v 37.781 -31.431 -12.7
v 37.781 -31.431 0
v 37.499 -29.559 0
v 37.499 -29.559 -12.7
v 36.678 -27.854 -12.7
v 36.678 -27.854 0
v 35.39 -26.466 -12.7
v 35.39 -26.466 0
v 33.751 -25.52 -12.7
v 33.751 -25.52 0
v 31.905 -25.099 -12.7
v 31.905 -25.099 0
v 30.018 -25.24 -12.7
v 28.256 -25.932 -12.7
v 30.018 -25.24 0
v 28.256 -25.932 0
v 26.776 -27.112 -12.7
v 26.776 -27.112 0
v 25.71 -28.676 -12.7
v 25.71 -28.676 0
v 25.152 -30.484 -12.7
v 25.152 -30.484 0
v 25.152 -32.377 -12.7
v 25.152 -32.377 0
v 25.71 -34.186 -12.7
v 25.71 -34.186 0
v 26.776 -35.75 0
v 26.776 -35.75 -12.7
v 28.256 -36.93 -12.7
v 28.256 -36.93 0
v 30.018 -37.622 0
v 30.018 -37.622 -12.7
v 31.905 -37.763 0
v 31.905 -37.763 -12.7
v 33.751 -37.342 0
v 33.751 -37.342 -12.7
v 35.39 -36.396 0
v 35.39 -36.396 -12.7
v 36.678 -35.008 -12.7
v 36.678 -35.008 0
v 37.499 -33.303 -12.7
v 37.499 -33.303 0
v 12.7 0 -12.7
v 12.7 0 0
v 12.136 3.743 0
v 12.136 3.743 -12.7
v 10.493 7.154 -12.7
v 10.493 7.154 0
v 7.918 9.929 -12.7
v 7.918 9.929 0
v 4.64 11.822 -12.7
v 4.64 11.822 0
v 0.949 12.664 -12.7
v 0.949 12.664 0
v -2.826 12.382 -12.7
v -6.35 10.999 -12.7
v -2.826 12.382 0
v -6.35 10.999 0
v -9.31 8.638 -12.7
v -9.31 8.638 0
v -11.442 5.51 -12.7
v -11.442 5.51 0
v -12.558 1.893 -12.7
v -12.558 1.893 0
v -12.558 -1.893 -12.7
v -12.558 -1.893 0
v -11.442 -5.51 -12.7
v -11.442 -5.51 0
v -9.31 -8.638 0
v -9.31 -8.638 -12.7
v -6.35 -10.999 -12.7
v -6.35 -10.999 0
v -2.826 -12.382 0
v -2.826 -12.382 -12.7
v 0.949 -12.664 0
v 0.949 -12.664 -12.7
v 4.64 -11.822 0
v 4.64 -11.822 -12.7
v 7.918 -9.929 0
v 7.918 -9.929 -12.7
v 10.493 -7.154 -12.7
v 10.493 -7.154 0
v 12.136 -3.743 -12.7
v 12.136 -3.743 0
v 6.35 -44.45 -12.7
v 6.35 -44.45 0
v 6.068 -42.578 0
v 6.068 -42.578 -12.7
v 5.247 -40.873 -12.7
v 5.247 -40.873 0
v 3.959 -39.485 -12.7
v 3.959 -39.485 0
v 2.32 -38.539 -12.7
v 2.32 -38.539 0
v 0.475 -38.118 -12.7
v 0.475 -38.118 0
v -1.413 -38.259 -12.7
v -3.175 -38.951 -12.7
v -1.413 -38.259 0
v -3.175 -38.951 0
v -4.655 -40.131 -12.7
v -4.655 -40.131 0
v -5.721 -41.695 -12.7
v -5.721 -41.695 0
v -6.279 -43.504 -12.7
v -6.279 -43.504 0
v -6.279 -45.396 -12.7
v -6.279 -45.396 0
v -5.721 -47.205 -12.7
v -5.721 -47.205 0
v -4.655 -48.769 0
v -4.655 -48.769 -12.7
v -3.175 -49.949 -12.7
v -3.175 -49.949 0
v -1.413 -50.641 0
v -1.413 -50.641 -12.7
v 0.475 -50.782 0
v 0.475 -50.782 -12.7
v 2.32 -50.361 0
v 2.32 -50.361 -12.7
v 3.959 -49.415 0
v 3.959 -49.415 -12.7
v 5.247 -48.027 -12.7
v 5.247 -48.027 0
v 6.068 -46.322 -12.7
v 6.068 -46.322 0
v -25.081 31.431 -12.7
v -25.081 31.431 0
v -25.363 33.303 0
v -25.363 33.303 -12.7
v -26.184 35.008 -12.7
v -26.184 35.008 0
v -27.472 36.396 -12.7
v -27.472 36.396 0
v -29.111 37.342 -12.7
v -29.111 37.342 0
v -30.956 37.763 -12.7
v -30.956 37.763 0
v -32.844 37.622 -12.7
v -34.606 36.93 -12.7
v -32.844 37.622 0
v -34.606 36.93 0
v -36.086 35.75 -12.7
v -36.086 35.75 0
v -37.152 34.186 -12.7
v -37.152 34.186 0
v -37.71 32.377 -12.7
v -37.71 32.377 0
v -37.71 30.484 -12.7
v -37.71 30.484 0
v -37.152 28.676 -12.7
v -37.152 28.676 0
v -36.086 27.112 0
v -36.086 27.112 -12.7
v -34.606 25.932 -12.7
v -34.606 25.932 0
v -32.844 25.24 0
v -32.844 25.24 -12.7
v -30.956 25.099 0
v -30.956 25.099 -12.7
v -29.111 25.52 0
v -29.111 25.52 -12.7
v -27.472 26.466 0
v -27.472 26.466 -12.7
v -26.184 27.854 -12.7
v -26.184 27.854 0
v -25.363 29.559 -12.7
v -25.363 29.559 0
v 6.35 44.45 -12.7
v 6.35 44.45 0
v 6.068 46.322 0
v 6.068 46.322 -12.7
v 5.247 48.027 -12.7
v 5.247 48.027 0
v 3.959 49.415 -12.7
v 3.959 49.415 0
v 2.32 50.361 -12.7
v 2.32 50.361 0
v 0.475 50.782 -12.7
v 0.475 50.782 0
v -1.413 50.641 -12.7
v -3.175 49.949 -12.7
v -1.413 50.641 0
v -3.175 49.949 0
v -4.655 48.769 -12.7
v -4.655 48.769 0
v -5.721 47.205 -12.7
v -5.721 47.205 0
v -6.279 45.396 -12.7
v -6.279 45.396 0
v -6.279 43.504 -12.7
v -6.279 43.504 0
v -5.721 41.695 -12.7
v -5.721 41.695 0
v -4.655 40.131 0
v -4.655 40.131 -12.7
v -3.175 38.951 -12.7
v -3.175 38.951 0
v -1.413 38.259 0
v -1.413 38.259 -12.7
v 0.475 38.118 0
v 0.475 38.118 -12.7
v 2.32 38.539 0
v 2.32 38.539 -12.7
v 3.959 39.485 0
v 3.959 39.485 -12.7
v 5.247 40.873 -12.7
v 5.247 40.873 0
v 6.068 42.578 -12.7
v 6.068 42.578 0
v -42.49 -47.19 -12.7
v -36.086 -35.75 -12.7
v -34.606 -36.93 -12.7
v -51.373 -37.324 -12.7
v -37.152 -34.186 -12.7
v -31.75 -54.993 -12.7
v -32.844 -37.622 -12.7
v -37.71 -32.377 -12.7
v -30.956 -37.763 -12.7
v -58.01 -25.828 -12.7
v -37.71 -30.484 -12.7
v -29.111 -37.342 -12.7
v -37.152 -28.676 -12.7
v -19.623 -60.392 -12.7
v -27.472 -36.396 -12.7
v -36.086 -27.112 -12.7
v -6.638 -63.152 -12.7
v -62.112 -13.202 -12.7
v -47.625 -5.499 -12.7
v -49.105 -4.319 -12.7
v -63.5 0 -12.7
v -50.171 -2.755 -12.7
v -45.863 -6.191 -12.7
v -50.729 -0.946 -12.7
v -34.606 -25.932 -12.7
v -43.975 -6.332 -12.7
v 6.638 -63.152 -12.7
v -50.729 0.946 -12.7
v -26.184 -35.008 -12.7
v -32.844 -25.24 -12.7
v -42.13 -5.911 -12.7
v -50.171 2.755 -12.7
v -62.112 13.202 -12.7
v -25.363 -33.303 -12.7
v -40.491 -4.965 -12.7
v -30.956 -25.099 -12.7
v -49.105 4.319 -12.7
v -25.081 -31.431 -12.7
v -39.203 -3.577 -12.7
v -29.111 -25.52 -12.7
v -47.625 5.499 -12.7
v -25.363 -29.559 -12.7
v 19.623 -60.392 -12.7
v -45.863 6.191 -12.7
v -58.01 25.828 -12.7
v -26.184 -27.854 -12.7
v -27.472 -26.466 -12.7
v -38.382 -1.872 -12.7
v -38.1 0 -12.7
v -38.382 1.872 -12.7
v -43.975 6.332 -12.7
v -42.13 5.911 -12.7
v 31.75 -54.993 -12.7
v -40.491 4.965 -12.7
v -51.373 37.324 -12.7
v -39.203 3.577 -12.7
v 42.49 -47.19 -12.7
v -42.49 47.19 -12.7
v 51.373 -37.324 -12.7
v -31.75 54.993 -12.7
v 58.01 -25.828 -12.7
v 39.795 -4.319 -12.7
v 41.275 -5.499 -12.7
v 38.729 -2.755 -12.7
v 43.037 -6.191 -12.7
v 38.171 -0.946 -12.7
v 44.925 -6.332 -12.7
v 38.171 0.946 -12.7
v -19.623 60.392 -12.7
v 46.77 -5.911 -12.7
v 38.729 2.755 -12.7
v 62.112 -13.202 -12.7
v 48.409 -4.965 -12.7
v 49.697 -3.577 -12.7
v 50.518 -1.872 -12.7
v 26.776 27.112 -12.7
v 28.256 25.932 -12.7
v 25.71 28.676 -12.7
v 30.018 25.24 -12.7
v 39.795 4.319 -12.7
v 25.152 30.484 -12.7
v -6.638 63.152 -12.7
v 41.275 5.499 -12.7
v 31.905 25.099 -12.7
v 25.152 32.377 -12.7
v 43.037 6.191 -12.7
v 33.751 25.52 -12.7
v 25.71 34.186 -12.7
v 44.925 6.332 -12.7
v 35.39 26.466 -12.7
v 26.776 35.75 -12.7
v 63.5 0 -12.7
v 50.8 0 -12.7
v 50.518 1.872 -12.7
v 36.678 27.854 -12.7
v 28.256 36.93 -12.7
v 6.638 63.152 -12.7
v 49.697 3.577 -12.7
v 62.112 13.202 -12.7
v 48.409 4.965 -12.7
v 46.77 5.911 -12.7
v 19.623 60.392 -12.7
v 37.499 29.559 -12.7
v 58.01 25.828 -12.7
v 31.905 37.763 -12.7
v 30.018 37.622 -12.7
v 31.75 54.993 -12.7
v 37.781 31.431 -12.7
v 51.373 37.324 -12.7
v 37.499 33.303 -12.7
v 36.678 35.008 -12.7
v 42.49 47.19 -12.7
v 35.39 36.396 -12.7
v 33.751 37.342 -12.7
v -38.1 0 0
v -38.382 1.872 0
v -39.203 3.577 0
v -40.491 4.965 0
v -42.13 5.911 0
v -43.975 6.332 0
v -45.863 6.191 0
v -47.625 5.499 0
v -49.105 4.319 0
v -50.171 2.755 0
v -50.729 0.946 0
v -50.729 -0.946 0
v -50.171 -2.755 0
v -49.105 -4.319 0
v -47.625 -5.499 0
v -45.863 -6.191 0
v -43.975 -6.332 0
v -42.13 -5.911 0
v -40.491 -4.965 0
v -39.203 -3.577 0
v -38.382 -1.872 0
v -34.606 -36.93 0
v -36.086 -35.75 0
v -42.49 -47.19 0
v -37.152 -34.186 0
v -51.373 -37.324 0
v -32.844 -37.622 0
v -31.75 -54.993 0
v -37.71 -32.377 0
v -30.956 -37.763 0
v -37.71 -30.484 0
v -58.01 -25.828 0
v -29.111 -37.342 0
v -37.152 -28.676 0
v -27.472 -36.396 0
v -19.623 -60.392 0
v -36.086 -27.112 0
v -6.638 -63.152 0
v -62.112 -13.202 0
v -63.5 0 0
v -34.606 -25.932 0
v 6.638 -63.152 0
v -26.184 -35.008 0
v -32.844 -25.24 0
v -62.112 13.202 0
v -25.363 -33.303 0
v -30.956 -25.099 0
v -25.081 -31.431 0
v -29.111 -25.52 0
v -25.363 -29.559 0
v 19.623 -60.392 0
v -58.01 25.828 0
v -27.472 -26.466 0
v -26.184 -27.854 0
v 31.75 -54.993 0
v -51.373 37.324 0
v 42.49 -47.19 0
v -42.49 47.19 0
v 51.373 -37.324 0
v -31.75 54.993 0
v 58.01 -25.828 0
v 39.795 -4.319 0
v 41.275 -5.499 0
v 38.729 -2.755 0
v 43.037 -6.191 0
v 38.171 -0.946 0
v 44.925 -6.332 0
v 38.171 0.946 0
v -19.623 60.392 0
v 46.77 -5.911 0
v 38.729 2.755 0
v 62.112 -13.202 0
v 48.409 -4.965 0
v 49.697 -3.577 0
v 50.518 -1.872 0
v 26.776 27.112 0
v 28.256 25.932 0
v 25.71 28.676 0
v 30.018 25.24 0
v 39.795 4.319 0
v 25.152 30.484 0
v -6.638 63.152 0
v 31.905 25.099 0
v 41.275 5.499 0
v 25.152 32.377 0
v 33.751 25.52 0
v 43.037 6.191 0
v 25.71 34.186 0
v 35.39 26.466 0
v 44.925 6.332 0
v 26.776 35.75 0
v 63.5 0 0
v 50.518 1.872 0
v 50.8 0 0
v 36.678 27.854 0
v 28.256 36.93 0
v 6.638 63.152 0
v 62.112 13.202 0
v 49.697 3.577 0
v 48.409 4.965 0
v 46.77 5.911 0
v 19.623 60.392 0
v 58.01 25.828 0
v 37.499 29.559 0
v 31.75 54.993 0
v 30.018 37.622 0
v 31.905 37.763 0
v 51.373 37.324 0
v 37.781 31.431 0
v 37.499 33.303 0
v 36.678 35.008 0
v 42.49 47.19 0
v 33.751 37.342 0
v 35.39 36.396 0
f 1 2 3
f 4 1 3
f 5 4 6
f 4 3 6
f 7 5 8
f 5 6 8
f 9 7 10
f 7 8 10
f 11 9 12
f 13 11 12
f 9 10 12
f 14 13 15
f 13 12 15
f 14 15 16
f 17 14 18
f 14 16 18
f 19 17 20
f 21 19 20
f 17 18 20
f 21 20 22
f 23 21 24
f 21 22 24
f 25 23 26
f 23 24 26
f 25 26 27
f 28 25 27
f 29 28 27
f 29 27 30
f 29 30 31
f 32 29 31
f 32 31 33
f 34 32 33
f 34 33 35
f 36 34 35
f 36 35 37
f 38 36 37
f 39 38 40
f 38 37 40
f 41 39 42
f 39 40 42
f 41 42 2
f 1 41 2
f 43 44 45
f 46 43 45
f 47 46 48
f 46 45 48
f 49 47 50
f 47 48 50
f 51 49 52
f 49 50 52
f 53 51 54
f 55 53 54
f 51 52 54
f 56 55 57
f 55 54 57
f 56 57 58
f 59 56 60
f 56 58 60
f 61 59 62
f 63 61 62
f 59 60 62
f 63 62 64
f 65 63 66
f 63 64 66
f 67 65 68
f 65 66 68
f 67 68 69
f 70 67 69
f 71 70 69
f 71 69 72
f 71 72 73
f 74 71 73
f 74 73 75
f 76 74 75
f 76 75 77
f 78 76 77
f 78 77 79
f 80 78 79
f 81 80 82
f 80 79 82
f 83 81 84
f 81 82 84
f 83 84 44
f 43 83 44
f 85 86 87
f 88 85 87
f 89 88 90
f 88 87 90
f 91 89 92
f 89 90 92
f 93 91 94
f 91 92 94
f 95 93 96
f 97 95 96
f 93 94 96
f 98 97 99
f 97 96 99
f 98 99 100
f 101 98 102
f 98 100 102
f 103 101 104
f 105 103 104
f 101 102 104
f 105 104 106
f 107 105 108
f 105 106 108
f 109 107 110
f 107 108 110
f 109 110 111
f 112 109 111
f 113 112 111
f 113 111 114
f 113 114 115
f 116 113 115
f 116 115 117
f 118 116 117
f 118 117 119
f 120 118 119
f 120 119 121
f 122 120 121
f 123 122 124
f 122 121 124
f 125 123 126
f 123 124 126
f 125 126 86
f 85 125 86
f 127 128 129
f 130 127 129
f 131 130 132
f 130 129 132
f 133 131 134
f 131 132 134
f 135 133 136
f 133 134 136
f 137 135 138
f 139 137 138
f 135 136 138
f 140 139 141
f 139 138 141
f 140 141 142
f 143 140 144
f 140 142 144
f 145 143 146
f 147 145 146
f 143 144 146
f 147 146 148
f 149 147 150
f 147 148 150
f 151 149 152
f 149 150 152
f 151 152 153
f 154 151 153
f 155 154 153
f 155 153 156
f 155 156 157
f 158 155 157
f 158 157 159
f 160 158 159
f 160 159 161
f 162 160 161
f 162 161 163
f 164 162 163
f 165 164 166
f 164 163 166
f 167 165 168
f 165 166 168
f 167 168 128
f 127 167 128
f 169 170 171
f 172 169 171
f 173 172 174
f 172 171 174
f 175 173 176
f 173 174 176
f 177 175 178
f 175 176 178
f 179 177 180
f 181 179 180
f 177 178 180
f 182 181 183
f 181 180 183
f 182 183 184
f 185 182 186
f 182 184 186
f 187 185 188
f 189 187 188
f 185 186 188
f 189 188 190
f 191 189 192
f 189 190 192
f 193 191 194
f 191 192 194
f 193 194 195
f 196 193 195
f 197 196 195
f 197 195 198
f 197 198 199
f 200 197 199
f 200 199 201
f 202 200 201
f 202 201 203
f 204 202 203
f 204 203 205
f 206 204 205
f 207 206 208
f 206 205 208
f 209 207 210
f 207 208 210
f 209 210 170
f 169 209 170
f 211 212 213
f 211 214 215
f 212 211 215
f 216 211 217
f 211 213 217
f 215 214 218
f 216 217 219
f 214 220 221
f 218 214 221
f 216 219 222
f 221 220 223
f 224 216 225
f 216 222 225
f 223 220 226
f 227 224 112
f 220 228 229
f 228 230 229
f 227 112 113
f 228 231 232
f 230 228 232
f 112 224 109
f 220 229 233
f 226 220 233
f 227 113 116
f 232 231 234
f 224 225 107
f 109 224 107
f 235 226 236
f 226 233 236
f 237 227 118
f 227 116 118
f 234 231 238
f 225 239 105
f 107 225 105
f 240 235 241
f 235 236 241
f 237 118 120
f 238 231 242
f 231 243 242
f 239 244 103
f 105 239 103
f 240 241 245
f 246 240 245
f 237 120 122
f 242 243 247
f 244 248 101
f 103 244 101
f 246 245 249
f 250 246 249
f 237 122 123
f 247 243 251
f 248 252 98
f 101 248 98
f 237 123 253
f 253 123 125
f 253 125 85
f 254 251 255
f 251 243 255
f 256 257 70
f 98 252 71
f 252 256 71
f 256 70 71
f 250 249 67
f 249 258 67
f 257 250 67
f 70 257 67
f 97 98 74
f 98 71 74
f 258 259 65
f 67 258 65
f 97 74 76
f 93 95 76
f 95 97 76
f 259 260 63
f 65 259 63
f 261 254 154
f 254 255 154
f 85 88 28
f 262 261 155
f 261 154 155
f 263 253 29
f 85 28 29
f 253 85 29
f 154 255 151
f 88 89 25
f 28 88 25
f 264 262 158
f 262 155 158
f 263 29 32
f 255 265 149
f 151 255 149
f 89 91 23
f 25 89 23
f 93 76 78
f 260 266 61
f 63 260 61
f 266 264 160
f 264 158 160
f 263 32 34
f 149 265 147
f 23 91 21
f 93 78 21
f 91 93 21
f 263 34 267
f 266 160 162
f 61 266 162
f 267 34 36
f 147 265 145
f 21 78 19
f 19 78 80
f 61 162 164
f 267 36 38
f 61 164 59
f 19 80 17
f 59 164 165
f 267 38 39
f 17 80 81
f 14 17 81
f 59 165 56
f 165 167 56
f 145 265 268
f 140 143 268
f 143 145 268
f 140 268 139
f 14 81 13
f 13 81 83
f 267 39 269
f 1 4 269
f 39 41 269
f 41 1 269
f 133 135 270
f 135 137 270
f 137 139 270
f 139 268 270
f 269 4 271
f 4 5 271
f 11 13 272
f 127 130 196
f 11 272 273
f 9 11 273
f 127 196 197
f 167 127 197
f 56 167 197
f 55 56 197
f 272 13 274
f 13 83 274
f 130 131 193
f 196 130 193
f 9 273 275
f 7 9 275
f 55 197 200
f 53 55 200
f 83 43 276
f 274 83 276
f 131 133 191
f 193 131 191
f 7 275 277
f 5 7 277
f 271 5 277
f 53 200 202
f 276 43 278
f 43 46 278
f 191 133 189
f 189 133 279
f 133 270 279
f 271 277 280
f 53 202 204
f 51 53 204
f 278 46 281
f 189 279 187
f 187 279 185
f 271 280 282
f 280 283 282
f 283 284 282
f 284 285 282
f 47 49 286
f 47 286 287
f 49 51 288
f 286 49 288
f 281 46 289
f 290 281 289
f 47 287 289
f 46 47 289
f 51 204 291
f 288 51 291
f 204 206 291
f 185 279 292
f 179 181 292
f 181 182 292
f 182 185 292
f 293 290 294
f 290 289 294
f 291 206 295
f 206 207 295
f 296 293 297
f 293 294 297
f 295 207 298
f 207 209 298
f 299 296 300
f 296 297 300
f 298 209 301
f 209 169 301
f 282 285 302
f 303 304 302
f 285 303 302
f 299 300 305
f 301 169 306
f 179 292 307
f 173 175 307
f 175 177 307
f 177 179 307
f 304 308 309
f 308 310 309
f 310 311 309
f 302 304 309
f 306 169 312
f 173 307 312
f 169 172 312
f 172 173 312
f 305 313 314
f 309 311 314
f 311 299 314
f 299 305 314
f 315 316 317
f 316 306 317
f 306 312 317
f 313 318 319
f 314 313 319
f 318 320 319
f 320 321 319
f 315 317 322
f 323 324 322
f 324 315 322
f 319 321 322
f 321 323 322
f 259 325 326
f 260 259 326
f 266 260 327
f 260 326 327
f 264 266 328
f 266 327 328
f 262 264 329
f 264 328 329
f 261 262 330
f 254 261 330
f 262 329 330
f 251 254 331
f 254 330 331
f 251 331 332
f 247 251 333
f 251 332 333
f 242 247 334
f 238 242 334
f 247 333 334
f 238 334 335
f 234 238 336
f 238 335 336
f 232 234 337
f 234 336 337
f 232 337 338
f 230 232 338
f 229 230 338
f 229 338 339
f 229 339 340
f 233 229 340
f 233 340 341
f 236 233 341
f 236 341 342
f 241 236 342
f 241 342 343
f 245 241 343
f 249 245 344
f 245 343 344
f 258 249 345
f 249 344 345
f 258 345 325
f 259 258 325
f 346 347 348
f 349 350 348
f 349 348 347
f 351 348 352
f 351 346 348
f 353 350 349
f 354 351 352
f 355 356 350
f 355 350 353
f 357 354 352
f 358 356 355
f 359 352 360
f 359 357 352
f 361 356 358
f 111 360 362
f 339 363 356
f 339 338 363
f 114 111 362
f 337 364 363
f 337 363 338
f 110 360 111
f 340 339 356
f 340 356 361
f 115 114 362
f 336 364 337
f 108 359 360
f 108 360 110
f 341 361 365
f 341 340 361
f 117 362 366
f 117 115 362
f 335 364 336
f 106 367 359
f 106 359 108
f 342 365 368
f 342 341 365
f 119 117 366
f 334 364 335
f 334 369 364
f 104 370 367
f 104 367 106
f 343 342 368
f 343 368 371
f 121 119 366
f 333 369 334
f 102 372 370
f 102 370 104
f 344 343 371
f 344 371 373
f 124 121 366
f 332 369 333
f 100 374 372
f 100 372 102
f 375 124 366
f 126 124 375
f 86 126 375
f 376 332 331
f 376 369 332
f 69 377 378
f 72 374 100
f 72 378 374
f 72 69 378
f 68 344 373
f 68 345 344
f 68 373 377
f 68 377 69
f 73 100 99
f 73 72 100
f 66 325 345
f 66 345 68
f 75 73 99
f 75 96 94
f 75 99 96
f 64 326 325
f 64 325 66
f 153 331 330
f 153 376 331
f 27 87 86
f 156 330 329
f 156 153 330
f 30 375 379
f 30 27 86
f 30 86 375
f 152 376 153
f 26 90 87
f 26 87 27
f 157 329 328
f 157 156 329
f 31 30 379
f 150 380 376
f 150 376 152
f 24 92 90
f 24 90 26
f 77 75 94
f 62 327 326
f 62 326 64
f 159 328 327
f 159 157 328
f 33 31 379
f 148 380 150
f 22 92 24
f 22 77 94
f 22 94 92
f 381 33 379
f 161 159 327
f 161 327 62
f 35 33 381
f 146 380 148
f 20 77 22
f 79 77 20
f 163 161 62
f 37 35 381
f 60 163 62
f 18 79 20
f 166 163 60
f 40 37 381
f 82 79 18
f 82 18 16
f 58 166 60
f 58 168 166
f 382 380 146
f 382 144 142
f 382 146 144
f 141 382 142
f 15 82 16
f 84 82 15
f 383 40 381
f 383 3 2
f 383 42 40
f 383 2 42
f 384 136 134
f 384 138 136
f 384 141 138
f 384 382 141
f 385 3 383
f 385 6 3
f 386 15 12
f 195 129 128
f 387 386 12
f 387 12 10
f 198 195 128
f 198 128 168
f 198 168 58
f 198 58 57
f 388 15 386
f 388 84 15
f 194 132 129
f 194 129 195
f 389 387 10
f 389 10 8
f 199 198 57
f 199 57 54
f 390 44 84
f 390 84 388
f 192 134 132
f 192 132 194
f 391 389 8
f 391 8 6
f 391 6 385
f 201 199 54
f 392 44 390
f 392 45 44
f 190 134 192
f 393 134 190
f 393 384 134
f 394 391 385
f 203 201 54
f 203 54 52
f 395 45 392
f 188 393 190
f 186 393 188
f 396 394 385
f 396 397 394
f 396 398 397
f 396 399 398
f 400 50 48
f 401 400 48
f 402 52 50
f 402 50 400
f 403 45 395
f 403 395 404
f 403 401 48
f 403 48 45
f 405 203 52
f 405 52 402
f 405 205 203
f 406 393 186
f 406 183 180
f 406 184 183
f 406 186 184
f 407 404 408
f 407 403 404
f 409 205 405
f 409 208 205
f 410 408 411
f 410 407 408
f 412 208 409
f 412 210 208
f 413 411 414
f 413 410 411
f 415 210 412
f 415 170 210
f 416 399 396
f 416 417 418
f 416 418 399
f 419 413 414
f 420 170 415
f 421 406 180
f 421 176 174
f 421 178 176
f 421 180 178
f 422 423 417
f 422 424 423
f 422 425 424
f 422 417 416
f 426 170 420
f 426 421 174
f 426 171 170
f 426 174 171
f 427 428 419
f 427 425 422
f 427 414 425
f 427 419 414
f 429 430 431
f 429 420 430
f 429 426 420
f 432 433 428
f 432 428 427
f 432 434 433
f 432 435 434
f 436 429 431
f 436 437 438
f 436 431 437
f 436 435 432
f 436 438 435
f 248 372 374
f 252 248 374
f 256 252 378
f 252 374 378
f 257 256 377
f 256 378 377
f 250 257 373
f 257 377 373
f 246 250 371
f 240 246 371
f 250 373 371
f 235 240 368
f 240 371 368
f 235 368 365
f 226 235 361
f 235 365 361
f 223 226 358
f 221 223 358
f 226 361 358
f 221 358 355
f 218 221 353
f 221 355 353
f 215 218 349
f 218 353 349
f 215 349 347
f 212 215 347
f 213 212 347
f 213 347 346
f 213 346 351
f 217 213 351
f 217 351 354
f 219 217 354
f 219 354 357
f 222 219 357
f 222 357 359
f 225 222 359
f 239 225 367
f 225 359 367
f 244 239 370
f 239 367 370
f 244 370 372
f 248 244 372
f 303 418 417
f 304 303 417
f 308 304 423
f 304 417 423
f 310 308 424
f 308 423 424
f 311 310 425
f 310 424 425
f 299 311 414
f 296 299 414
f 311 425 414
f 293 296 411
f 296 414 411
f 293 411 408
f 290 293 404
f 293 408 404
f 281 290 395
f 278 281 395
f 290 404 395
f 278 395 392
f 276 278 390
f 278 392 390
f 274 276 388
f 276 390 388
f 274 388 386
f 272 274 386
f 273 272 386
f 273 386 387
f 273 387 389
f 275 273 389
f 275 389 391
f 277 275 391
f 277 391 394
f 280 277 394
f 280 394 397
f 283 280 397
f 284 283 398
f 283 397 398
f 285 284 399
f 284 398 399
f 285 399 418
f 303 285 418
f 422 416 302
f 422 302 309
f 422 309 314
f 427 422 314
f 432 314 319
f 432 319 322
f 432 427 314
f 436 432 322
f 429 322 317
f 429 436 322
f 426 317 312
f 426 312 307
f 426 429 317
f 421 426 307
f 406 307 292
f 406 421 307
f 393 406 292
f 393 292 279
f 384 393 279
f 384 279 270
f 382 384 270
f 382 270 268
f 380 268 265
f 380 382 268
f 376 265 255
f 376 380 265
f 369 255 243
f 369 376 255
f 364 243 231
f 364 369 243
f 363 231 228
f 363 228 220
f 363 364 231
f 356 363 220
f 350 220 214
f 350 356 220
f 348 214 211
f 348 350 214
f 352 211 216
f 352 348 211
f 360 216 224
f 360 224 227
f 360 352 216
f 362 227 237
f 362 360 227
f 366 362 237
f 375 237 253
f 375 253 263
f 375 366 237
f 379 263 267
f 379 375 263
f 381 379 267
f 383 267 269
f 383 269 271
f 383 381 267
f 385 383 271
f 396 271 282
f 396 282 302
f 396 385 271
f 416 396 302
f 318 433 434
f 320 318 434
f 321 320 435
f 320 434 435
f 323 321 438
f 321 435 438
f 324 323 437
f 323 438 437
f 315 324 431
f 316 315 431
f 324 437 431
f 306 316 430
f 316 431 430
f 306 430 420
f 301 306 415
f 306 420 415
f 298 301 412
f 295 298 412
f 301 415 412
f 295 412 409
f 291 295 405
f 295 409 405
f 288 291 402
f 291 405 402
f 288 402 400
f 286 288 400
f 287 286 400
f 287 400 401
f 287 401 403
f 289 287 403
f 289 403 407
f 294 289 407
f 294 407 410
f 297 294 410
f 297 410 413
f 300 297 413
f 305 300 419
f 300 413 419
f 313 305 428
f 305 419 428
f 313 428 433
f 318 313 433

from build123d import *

# Parameters (mm, degrees)
F0_R     = 63.5
F0_R_2   = 6.35
F0_R_3   = 12.7
F1_DEPTH = 12.7


with BuildPart() as f1:
    # F0 (on Top) → F1 (new body)
    with BuildSketch(Plane.XY):
        Circle(F0_R)
        with Locations((-31.430896, -31.430896)):
            Circle(F0_R_2, mode=Mode.SUBTRACT)
        with Locations((0, -44.45)):
            Circle(F0_R_2, mode=Mode.SUBTRACT)
        with Locations((31.430896, -31.430896)):
            Circle(F0_R_2, mode=Mode.SUBTRACT)
        with Locations((-44.45, 0)):
            Circle(F0_R_2, mode=Mode.SUBTRACT)
        with Locations((-31.430896, 31.430896)):
            Circle(F0_R_2, mode=Mode.SUBTRACT)
        Circle(F0_R_3, mode=Mode.SUBTRACT)
        with Locations((31.430896, 31.430896)):
            Circle(F0_R_2, mode=Mode.SUBTRACT)
        with Locations((44.45, 0)):
            Circle(F0_R_2, mode=Mode.SUBTRACT)
        with Locations((0, 44.45)):
            Circle(F0_R_2, mode=Mode.SUBTRACT)
    extrude(amount=-F1_DEPTH)


solid = f1.part
